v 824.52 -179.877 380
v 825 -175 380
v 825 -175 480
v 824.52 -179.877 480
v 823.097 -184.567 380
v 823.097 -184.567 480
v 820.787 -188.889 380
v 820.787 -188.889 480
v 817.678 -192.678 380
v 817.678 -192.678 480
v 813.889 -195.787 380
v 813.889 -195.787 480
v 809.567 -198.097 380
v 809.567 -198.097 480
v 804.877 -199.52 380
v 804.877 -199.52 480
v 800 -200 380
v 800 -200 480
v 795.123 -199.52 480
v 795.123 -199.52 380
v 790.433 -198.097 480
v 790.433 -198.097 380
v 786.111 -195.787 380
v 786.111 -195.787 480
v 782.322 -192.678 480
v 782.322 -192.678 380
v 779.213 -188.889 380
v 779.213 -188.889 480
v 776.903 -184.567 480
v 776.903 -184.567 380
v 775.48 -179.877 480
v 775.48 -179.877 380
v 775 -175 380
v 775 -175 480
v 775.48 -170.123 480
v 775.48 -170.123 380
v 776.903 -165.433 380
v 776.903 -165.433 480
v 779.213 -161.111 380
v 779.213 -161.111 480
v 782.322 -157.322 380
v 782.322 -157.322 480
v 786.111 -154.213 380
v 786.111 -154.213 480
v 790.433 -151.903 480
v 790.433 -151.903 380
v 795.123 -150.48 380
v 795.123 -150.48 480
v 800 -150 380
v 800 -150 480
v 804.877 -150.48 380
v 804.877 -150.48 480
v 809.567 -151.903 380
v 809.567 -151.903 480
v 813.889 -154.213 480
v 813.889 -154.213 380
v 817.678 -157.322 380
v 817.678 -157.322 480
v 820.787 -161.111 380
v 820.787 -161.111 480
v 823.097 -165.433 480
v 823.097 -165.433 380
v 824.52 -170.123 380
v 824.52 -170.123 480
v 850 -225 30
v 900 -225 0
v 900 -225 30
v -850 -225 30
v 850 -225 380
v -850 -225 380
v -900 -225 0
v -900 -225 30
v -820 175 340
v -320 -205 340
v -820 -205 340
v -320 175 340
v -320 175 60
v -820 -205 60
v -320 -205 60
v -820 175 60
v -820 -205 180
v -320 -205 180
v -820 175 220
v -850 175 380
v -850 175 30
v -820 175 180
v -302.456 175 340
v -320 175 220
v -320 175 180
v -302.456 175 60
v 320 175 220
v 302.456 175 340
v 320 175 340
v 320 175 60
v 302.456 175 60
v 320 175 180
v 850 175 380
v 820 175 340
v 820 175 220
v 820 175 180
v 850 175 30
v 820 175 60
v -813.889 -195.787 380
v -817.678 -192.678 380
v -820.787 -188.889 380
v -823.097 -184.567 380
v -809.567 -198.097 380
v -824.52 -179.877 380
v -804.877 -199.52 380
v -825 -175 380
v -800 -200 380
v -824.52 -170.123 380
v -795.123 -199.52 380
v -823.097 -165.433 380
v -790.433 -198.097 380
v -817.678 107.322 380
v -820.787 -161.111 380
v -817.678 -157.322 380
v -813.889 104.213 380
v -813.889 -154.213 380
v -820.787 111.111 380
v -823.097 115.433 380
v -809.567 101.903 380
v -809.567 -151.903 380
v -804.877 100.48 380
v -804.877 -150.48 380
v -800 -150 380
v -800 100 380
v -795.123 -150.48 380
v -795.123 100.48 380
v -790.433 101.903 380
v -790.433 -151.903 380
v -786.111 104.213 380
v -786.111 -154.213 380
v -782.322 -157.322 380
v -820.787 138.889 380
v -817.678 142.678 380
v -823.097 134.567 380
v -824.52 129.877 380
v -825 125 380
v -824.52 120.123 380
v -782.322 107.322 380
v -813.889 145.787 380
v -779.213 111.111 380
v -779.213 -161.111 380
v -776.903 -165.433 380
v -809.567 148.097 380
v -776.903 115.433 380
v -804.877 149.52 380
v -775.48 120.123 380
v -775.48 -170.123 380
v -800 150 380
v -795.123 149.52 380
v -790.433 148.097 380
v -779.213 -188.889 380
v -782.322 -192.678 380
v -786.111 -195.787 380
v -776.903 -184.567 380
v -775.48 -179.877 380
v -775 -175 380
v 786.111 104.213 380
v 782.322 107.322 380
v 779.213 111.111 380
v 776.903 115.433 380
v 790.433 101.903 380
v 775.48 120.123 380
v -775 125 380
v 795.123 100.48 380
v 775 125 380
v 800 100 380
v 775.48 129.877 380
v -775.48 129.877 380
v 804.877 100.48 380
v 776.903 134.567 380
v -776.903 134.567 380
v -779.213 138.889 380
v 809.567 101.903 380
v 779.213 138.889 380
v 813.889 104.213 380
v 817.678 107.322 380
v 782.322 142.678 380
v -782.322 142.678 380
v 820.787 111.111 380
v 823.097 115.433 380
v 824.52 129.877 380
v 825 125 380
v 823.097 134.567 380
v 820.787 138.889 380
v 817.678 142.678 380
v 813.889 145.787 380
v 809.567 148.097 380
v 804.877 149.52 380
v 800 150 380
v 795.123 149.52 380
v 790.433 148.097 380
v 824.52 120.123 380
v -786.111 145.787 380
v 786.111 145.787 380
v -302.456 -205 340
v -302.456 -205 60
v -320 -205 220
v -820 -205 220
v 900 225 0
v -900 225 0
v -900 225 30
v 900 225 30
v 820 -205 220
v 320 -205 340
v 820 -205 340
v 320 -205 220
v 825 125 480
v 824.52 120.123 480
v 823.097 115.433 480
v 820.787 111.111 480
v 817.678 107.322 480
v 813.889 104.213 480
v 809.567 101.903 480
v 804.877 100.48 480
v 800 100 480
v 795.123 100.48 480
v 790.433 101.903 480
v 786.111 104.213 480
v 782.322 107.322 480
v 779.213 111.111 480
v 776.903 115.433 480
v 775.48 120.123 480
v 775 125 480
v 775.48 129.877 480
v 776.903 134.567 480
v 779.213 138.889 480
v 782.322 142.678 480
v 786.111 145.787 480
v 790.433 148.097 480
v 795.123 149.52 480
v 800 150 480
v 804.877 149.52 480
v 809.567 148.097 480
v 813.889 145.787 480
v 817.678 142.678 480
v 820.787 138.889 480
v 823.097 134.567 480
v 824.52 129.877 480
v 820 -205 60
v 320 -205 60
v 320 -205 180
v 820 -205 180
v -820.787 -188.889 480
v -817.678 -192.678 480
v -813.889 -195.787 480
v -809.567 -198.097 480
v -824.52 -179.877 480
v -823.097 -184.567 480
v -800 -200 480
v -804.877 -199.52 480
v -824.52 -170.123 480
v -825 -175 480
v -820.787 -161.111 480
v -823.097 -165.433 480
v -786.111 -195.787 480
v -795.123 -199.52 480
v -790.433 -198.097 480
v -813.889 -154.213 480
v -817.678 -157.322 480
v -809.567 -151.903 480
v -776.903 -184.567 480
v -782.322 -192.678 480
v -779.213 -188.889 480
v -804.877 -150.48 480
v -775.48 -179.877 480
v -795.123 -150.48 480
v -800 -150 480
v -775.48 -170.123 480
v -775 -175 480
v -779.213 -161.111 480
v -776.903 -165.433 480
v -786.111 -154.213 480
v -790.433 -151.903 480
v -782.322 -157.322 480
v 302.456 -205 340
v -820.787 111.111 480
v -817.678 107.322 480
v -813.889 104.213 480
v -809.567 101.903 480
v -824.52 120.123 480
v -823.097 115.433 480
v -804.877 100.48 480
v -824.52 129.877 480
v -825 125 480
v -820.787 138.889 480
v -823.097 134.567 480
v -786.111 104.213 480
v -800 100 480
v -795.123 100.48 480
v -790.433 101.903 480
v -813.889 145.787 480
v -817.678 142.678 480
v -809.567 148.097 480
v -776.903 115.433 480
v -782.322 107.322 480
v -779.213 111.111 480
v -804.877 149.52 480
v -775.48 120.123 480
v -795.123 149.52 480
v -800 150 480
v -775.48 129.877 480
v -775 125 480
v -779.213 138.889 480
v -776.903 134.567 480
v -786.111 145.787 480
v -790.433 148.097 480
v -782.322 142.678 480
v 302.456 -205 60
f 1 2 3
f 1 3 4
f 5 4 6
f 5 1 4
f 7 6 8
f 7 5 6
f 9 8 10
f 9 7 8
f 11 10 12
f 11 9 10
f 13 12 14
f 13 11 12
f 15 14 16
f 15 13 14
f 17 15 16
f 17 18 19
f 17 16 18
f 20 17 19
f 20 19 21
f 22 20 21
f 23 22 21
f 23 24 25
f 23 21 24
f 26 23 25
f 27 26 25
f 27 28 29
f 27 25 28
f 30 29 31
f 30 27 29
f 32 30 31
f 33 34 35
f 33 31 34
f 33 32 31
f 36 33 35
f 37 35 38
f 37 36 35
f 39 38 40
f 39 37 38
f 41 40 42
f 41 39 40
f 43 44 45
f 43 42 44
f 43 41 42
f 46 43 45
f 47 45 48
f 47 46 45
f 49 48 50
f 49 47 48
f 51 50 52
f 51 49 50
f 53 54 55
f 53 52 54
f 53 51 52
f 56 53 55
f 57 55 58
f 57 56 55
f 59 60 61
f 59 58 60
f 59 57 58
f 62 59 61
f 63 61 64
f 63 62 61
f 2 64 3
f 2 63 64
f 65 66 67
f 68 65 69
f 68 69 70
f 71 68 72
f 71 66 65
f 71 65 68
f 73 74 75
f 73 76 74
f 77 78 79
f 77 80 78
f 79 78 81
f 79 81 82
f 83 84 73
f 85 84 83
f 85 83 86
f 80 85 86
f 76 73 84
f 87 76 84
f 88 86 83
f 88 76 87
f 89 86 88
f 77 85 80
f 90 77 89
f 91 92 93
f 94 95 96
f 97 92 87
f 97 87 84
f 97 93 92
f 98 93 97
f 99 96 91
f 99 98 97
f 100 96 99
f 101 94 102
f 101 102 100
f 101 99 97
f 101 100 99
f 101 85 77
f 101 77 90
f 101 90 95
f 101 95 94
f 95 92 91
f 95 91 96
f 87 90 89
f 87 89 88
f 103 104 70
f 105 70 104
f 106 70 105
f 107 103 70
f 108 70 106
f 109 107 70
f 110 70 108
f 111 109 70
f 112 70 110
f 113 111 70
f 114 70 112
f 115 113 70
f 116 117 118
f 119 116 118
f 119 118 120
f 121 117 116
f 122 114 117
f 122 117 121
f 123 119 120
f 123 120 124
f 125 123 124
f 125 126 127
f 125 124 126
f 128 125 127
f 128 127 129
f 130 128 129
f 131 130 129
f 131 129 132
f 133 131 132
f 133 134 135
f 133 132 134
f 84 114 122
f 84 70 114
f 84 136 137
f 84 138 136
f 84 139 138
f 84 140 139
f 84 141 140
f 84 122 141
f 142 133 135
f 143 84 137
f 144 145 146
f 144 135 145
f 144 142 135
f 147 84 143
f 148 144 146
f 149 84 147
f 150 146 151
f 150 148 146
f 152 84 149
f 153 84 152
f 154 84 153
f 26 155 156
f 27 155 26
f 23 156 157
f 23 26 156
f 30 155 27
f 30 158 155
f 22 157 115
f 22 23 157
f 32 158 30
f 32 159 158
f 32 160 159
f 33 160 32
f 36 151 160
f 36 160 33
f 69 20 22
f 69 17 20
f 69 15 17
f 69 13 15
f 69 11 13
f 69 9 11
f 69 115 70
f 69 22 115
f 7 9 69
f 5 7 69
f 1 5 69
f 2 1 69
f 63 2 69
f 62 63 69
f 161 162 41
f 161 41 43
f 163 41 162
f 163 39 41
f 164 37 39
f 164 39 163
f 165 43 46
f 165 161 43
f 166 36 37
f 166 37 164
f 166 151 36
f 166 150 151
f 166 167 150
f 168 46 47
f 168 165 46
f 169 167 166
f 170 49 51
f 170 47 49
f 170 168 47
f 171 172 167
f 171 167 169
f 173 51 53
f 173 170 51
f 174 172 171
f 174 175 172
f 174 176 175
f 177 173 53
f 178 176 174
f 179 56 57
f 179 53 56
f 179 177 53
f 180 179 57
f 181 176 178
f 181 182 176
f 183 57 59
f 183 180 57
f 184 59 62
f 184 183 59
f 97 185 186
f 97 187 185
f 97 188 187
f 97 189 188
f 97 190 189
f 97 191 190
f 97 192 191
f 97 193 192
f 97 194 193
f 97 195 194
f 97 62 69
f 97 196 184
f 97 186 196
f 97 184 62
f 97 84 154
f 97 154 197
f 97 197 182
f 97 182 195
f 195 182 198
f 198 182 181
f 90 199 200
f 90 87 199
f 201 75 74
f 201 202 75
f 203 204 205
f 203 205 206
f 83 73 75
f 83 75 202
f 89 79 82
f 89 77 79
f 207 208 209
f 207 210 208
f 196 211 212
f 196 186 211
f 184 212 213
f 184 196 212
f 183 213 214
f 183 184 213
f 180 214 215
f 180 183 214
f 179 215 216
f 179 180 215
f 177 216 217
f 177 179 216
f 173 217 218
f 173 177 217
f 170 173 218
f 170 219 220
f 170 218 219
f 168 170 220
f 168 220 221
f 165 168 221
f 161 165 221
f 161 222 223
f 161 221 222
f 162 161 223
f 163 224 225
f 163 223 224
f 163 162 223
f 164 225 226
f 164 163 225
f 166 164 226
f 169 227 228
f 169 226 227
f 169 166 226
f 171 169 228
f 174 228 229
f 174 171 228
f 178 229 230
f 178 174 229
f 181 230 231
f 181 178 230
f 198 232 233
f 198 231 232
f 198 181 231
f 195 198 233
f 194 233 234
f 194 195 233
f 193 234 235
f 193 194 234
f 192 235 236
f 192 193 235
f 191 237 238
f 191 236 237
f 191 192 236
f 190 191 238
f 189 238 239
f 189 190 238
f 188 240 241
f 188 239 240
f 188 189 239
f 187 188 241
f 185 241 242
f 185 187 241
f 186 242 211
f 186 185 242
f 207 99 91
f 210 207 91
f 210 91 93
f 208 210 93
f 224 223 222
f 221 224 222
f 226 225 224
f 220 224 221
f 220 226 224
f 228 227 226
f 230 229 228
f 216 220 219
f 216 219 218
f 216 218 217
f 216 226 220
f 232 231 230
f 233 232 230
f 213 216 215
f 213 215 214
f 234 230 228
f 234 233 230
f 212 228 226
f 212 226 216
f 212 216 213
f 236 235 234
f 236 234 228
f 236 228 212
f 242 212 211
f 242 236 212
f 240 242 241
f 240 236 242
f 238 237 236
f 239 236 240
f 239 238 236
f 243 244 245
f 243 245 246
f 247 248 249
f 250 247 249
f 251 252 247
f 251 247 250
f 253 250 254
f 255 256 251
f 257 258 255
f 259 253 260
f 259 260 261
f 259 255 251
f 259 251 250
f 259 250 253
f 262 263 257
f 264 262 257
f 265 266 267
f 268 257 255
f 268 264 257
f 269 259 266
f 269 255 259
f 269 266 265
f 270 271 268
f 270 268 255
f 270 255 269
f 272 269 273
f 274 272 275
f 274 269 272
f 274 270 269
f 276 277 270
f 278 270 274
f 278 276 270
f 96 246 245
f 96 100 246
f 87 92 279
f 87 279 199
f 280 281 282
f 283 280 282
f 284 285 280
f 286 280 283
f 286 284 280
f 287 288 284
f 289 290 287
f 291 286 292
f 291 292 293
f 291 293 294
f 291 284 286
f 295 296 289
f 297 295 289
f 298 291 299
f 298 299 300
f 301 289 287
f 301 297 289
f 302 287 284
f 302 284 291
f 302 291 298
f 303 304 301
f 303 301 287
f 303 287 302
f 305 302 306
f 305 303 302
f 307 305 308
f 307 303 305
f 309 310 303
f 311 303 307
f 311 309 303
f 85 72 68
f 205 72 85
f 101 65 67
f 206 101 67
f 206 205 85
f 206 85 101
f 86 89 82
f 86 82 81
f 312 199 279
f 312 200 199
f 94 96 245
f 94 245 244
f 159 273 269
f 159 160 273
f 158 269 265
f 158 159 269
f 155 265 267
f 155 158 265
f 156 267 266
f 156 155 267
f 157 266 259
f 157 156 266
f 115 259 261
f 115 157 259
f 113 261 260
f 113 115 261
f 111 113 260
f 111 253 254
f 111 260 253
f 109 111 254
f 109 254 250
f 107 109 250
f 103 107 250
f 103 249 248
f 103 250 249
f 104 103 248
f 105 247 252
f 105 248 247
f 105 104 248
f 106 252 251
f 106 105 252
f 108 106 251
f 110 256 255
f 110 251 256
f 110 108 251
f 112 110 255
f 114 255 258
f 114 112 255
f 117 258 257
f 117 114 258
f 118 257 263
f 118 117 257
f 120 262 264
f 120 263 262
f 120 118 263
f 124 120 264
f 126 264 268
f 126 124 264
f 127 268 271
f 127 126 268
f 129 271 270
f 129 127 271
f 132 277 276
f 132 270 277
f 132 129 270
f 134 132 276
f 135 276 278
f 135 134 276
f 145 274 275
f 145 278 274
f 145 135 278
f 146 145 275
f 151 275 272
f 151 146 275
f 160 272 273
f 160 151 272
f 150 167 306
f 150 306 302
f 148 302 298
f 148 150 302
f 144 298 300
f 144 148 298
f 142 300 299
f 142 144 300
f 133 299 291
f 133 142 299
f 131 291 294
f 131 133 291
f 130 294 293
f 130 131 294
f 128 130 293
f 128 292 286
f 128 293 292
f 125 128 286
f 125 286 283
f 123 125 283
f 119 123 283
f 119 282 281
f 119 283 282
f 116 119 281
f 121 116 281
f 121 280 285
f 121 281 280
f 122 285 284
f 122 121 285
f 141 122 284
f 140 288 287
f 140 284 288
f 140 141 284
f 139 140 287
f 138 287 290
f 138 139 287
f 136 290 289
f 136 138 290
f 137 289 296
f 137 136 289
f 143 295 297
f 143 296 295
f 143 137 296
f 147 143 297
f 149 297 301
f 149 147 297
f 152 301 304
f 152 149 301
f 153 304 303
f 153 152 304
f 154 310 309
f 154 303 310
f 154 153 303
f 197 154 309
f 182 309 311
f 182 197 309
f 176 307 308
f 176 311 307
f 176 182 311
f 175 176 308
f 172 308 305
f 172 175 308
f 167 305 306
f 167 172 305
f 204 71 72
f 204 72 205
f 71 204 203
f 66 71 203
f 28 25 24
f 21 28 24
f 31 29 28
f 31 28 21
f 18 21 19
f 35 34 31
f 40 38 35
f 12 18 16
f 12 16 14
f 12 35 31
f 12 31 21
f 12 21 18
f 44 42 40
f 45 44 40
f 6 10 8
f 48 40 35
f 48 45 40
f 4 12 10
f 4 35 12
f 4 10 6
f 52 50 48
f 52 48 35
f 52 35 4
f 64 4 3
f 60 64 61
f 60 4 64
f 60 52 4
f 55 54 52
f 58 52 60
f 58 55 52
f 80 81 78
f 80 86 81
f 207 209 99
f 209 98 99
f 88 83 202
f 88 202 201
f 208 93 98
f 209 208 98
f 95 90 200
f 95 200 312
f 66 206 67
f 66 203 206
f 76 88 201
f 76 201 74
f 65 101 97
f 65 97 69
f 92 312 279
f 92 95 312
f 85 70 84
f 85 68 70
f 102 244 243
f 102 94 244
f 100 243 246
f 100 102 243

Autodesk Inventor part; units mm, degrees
ref_plane "YZ Plane" through (0, 0, 0) normal (1, 0, 0) x (0, 1, 0)
ref_plane "XZ Plane" through (0, 0, 0) normal (0, 1, 0) x (-1, 0, 0)
ref_plane "XY Plane" through (0, 0, 0) normal (0, 0, 1) x (1, 0, 0)
sketch "스케치1" plane through (0, 0, 0) normal (0, 0, 1) x (1, 0, 0)
  line L0 (900, -225) -> (-900, -225)
  line L1 (-900, -225) -> (-900, 225)
  line L2 (-900, 225) -> (900, 225)
  line L3 (900, 225) -> (900, -225)
  line L4 (900, -225) -> (-900, 225) construction
  line L5 (-900, -225) -> (900, 225) construction
  point P0 (0, 0)
  dimension "d0" = 1800
  dimension "d1" = 450
extrude "돌출1" add sketch "스케치1" along normal blind 30
sketch "스케치2" plane through (0, 0, 30) normal (0, 0, 1) x (1, 0, 0)
  line L0 (-900, -225) -> (900, -225) projected
  line L1 (-850, 175) -> (850, 175)
  line L2 (850, 175) -> (850, -225)
  line L3 (850, -225) -> (-850, -225)
  line L4 (-850, -225) -> (-850, 175)
  line L5 (900, 225) -> (-900, 225) projected
  line L6 (-900, 225) -> (-900, -225) projected
  line L7 (900, -225) -> (900, 225) projected
  point P0 (0, 0)
  dimension "d4" = 50
  dimension "d5" = 50
  dimension "d6" = 50
extrude "돌출2" add sketch "스케치2" along normal blind 350 contours L4 L1 L2 L0
sketch "스케치3" plane through (-850, 175, 30) normal (0, 1, 0) x (1, 0, 0)
  line L0 (0, 0) -> (1700, 0) construction
  line L1 (850, 0) -> (850, -673.9117) construction
  line L2 (30, -30) -> (530, -30)
  line L3 (530, -30) -> (530, -150)
  line L4 (530, -150) -> (30, -150)
  line L5 (30, -150) -> (30, -30)
  line L6 (0, 0) -> (0, -350) projected
  line L7 (1170, -30) -> (1670, -30)
  line L8 (1670, -30) -> (1670, -150)
  line L9 (1670, -150) -> (1170, -150)
  line L10 (1170, -150) -> (1170, -30)
  line L11 (1700, 0) -> (1700, -350) projected
  line L12 (30, -190) -> (530, -190)
  line L13 (530, -190) -> (530, -310)
  line L14 (530, -310) -> (30, -310)
  line L15 (30, -310) -> (30, -190)
  line L16 (1670, -190) -> (1170, -190)
  line L17 (1170, -190) -> (1170, -310)
  line L18 (1170, -310) -> (1670, -310)
  line L19 (1670, -310) -> (1670, -190)
  point P0 (850, 30)
  dimension "d9" = 120
  dimension "d10" = 30
  dimension "d11" = 120
  dimension "d12" = 30
  dimension "d13" = 500
  dimension "d14" = 500
  dimension "d15" = 120
  dimension "d16" = 40
  dimension "d17" = 30
  dimension "d18" = 30
extrude "돌출3" cut sketch "스케치3" against normal blind 380
sketch "스케치4" plane through (-850, 175, 30) normal (0, 1, 0) x (1, 0, 0)
  line L0 (850, 30) -> (850, -738.9352) construction
  line L1 (1152.4561, -310) -> (547.5439, -310)
  line L2 (547.5439, -310) -> (547.5439, -30)
  line L3 (547.5439, -30) -> (1152.4561, -30)
  line L4 (1152.4561, -30) -> (1152.4561, -310)
  line L5 (1152.4561, -310) -> (547.5439, -30) construction
  line L6 (547.5439, -310) -> (1152.4561, -30) construction
  line L7 (30, -30) -> (530, -30) projected
  line L8 (530, -310) -> (30, -310) projected
  point P0 (850, -170)
  dimension "d21" = 0
  dimension "d22" = 0
extrude "돌출4" cut sketch "스케치4" against normal blind 380
sketch "스케치5" plane through (0, 0, 380) normal (0, 0, 1) x (1, 0, 0)
  line L0 (-800, 125) -> (800, 125) construction
  line L1 (800, 125) -> (800, -175) construction
  line L2 (800, -175) -> (-800, -175) construction
  line L3 (-800, -175) -> (-800, 125) construction
  line L4 (850, 175) -> (-850, 175) projected
  line L5 (-850, -225) -> (850, -225) projected
  line L6 (850, -225) -> (850, 175) projected
  line L7 (-850, 175) -> (-850, -225) projected
  circle A0 centre (-800, 125) radius 25
  circle A1 centre (800, 125) radius 25
  circle A2 centre (800, -175) radius 25
  circle A3 centre (-800, -175) radius 25
  point P0 (0, 0)
  dimension "d26" = 50
  dimension "d27" = 50
  dimension "d28" = 50
  dimension "d29" = 50
  dimension "d30" = 50
  dimension "d31" = 50
  dimension "d32" = 50
  dimension "d33" = 50
extrude "돌출5" add sketch "스케치5" along normal blind 100 contours A0 | A1 | A2 | A3
properties part number "240531_3Dstorage"
